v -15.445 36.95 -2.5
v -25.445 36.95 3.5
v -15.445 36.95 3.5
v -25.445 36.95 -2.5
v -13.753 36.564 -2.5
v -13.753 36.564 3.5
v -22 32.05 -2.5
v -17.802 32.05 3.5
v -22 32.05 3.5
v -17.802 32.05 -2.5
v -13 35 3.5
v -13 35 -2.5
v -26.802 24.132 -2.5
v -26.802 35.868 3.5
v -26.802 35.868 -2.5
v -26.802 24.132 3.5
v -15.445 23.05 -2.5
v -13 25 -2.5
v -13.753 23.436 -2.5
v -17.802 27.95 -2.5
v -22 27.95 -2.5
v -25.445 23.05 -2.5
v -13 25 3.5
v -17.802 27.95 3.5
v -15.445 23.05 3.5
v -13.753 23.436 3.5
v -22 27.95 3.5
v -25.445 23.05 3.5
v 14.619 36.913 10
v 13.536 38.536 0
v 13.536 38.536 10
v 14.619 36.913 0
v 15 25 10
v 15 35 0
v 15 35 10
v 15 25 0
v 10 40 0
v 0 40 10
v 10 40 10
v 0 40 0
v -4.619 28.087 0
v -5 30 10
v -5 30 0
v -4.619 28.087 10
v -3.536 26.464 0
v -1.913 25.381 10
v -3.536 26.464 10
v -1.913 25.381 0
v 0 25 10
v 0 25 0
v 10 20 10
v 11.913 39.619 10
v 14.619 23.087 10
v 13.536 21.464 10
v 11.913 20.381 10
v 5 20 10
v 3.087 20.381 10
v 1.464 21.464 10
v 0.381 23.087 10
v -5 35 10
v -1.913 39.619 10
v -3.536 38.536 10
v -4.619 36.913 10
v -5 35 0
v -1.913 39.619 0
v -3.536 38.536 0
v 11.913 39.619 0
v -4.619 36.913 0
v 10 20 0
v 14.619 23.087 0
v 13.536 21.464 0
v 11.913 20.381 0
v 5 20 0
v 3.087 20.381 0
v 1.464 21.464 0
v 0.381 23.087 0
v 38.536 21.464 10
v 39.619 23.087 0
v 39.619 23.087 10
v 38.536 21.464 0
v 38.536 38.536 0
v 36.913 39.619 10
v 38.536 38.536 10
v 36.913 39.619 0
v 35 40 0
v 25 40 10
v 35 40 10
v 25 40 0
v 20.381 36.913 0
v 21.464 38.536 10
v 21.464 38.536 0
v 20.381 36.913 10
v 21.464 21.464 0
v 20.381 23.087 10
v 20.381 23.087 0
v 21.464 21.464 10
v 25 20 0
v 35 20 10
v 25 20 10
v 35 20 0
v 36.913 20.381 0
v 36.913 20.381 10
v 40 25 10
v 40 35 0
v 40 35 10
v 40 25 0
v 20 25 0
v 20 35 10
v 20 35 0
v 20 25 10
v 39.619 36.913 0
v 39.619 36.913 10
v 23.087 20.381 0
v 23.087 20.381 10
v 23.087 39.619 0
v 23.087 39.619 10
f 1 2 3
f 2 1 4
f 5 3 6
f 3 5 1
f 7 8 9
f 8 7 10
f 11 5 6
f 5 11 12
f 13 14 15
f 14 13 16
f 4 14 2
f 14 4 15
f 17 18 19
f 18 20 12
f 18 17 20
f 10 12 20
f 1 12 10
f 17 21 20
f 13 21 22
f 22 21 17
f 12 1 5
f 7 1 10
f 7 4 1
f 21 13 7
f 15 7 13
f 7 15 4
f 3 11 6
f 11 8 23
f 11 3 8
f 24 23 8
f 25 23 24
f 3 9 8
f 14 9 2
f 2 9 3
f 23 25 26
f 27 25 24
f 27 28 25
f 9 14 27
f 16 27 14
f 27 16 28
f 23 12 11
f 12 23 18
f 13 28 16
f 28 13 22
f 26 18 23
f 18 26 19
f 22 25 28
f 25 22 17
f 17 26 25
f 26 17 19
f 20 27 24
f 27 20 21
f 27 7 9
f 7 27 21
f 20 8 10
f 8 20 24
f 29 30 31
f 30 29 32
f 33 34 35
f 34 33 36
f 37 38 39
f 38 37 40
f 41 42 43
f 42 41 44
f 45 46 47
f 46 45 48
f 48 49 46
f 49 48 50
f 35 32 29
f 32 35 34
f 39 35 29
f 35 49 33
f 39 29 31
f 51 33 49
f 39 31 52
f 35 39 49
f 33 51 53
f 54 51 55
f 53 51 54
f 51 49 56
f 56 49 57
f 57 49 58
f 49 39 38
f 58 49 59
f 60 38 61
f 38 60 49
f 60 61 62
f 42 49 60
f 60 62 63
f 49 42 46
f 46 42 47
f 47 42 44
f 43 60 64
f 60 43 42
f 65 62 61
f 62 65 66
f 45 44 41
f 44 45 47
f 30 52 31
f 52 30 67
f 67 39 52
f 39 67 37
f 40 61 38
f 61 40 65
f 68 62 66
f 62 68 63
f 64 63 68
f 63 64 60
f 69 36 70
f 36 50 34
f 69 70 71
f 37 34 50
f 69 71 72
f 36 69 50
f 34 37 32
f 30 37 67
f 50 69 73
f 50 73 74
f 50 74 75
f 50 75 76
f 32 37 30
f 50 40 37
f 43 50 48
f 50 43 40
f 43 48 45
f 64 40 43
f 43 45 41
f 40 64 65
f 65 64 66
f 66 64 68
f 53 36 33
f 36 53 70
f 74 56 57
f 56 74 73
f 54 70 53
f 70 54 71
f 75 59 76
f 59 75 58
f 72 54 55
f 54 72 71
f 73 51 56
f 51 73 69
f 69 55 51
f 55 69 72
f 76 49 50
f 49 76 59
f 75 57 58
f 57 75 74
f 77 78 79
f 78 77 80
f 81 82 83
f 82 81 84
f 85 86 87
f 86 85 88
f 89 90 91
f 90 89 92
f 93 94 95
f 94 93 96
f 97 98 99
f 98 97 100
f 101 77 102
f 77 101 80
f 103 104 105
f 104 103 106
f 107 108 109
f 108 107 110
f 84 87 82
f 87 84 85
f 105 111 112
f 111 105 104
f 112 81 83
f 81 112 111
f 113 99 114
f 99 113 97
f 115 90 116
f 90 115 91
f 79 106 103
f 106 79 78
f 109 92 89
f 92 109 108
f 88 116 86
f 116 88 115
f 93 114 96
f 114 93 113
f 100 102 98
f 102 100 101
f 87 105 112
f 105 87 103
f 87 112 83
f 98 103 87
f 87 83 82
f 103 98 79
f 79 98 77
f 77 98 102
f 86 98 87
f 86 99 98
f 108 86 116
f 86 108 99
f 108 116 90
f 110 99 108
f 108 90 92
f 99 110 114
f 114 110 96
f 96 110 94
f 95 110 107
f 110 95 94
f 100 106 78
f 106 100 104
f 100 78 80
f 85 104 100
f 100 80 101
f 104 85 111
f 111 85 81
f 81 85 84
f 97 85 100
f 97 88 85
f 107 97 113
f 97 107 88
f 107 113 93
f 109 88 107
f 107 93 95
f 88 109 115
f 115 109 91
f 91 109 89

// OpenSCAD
module roundedBox3dSimple() {
    minkowski() {
        cube([10,10,5]);
        cylinder(r=5, h=5);
    }
}

module roundedBox3dCut() {
    minkowski() {
        difference() {
            cube([10,10,5]);
            cube([5,5,5]);
        }
        cylinder(r=5, h=5);
    }
}

module roundedBox3dHole() {
    minkowski() {
        difference() {
            cube([10,10,5], center=true);
            cube([8,8,10], center=true);
        }
        cylinder(r=2);
    }
}

translate([-20,30,0]) roundedBox3dHole();
translate([0,25,0]) roundedBox3dCut();
translate([25,25,0]) roundedBox3dSimple();
